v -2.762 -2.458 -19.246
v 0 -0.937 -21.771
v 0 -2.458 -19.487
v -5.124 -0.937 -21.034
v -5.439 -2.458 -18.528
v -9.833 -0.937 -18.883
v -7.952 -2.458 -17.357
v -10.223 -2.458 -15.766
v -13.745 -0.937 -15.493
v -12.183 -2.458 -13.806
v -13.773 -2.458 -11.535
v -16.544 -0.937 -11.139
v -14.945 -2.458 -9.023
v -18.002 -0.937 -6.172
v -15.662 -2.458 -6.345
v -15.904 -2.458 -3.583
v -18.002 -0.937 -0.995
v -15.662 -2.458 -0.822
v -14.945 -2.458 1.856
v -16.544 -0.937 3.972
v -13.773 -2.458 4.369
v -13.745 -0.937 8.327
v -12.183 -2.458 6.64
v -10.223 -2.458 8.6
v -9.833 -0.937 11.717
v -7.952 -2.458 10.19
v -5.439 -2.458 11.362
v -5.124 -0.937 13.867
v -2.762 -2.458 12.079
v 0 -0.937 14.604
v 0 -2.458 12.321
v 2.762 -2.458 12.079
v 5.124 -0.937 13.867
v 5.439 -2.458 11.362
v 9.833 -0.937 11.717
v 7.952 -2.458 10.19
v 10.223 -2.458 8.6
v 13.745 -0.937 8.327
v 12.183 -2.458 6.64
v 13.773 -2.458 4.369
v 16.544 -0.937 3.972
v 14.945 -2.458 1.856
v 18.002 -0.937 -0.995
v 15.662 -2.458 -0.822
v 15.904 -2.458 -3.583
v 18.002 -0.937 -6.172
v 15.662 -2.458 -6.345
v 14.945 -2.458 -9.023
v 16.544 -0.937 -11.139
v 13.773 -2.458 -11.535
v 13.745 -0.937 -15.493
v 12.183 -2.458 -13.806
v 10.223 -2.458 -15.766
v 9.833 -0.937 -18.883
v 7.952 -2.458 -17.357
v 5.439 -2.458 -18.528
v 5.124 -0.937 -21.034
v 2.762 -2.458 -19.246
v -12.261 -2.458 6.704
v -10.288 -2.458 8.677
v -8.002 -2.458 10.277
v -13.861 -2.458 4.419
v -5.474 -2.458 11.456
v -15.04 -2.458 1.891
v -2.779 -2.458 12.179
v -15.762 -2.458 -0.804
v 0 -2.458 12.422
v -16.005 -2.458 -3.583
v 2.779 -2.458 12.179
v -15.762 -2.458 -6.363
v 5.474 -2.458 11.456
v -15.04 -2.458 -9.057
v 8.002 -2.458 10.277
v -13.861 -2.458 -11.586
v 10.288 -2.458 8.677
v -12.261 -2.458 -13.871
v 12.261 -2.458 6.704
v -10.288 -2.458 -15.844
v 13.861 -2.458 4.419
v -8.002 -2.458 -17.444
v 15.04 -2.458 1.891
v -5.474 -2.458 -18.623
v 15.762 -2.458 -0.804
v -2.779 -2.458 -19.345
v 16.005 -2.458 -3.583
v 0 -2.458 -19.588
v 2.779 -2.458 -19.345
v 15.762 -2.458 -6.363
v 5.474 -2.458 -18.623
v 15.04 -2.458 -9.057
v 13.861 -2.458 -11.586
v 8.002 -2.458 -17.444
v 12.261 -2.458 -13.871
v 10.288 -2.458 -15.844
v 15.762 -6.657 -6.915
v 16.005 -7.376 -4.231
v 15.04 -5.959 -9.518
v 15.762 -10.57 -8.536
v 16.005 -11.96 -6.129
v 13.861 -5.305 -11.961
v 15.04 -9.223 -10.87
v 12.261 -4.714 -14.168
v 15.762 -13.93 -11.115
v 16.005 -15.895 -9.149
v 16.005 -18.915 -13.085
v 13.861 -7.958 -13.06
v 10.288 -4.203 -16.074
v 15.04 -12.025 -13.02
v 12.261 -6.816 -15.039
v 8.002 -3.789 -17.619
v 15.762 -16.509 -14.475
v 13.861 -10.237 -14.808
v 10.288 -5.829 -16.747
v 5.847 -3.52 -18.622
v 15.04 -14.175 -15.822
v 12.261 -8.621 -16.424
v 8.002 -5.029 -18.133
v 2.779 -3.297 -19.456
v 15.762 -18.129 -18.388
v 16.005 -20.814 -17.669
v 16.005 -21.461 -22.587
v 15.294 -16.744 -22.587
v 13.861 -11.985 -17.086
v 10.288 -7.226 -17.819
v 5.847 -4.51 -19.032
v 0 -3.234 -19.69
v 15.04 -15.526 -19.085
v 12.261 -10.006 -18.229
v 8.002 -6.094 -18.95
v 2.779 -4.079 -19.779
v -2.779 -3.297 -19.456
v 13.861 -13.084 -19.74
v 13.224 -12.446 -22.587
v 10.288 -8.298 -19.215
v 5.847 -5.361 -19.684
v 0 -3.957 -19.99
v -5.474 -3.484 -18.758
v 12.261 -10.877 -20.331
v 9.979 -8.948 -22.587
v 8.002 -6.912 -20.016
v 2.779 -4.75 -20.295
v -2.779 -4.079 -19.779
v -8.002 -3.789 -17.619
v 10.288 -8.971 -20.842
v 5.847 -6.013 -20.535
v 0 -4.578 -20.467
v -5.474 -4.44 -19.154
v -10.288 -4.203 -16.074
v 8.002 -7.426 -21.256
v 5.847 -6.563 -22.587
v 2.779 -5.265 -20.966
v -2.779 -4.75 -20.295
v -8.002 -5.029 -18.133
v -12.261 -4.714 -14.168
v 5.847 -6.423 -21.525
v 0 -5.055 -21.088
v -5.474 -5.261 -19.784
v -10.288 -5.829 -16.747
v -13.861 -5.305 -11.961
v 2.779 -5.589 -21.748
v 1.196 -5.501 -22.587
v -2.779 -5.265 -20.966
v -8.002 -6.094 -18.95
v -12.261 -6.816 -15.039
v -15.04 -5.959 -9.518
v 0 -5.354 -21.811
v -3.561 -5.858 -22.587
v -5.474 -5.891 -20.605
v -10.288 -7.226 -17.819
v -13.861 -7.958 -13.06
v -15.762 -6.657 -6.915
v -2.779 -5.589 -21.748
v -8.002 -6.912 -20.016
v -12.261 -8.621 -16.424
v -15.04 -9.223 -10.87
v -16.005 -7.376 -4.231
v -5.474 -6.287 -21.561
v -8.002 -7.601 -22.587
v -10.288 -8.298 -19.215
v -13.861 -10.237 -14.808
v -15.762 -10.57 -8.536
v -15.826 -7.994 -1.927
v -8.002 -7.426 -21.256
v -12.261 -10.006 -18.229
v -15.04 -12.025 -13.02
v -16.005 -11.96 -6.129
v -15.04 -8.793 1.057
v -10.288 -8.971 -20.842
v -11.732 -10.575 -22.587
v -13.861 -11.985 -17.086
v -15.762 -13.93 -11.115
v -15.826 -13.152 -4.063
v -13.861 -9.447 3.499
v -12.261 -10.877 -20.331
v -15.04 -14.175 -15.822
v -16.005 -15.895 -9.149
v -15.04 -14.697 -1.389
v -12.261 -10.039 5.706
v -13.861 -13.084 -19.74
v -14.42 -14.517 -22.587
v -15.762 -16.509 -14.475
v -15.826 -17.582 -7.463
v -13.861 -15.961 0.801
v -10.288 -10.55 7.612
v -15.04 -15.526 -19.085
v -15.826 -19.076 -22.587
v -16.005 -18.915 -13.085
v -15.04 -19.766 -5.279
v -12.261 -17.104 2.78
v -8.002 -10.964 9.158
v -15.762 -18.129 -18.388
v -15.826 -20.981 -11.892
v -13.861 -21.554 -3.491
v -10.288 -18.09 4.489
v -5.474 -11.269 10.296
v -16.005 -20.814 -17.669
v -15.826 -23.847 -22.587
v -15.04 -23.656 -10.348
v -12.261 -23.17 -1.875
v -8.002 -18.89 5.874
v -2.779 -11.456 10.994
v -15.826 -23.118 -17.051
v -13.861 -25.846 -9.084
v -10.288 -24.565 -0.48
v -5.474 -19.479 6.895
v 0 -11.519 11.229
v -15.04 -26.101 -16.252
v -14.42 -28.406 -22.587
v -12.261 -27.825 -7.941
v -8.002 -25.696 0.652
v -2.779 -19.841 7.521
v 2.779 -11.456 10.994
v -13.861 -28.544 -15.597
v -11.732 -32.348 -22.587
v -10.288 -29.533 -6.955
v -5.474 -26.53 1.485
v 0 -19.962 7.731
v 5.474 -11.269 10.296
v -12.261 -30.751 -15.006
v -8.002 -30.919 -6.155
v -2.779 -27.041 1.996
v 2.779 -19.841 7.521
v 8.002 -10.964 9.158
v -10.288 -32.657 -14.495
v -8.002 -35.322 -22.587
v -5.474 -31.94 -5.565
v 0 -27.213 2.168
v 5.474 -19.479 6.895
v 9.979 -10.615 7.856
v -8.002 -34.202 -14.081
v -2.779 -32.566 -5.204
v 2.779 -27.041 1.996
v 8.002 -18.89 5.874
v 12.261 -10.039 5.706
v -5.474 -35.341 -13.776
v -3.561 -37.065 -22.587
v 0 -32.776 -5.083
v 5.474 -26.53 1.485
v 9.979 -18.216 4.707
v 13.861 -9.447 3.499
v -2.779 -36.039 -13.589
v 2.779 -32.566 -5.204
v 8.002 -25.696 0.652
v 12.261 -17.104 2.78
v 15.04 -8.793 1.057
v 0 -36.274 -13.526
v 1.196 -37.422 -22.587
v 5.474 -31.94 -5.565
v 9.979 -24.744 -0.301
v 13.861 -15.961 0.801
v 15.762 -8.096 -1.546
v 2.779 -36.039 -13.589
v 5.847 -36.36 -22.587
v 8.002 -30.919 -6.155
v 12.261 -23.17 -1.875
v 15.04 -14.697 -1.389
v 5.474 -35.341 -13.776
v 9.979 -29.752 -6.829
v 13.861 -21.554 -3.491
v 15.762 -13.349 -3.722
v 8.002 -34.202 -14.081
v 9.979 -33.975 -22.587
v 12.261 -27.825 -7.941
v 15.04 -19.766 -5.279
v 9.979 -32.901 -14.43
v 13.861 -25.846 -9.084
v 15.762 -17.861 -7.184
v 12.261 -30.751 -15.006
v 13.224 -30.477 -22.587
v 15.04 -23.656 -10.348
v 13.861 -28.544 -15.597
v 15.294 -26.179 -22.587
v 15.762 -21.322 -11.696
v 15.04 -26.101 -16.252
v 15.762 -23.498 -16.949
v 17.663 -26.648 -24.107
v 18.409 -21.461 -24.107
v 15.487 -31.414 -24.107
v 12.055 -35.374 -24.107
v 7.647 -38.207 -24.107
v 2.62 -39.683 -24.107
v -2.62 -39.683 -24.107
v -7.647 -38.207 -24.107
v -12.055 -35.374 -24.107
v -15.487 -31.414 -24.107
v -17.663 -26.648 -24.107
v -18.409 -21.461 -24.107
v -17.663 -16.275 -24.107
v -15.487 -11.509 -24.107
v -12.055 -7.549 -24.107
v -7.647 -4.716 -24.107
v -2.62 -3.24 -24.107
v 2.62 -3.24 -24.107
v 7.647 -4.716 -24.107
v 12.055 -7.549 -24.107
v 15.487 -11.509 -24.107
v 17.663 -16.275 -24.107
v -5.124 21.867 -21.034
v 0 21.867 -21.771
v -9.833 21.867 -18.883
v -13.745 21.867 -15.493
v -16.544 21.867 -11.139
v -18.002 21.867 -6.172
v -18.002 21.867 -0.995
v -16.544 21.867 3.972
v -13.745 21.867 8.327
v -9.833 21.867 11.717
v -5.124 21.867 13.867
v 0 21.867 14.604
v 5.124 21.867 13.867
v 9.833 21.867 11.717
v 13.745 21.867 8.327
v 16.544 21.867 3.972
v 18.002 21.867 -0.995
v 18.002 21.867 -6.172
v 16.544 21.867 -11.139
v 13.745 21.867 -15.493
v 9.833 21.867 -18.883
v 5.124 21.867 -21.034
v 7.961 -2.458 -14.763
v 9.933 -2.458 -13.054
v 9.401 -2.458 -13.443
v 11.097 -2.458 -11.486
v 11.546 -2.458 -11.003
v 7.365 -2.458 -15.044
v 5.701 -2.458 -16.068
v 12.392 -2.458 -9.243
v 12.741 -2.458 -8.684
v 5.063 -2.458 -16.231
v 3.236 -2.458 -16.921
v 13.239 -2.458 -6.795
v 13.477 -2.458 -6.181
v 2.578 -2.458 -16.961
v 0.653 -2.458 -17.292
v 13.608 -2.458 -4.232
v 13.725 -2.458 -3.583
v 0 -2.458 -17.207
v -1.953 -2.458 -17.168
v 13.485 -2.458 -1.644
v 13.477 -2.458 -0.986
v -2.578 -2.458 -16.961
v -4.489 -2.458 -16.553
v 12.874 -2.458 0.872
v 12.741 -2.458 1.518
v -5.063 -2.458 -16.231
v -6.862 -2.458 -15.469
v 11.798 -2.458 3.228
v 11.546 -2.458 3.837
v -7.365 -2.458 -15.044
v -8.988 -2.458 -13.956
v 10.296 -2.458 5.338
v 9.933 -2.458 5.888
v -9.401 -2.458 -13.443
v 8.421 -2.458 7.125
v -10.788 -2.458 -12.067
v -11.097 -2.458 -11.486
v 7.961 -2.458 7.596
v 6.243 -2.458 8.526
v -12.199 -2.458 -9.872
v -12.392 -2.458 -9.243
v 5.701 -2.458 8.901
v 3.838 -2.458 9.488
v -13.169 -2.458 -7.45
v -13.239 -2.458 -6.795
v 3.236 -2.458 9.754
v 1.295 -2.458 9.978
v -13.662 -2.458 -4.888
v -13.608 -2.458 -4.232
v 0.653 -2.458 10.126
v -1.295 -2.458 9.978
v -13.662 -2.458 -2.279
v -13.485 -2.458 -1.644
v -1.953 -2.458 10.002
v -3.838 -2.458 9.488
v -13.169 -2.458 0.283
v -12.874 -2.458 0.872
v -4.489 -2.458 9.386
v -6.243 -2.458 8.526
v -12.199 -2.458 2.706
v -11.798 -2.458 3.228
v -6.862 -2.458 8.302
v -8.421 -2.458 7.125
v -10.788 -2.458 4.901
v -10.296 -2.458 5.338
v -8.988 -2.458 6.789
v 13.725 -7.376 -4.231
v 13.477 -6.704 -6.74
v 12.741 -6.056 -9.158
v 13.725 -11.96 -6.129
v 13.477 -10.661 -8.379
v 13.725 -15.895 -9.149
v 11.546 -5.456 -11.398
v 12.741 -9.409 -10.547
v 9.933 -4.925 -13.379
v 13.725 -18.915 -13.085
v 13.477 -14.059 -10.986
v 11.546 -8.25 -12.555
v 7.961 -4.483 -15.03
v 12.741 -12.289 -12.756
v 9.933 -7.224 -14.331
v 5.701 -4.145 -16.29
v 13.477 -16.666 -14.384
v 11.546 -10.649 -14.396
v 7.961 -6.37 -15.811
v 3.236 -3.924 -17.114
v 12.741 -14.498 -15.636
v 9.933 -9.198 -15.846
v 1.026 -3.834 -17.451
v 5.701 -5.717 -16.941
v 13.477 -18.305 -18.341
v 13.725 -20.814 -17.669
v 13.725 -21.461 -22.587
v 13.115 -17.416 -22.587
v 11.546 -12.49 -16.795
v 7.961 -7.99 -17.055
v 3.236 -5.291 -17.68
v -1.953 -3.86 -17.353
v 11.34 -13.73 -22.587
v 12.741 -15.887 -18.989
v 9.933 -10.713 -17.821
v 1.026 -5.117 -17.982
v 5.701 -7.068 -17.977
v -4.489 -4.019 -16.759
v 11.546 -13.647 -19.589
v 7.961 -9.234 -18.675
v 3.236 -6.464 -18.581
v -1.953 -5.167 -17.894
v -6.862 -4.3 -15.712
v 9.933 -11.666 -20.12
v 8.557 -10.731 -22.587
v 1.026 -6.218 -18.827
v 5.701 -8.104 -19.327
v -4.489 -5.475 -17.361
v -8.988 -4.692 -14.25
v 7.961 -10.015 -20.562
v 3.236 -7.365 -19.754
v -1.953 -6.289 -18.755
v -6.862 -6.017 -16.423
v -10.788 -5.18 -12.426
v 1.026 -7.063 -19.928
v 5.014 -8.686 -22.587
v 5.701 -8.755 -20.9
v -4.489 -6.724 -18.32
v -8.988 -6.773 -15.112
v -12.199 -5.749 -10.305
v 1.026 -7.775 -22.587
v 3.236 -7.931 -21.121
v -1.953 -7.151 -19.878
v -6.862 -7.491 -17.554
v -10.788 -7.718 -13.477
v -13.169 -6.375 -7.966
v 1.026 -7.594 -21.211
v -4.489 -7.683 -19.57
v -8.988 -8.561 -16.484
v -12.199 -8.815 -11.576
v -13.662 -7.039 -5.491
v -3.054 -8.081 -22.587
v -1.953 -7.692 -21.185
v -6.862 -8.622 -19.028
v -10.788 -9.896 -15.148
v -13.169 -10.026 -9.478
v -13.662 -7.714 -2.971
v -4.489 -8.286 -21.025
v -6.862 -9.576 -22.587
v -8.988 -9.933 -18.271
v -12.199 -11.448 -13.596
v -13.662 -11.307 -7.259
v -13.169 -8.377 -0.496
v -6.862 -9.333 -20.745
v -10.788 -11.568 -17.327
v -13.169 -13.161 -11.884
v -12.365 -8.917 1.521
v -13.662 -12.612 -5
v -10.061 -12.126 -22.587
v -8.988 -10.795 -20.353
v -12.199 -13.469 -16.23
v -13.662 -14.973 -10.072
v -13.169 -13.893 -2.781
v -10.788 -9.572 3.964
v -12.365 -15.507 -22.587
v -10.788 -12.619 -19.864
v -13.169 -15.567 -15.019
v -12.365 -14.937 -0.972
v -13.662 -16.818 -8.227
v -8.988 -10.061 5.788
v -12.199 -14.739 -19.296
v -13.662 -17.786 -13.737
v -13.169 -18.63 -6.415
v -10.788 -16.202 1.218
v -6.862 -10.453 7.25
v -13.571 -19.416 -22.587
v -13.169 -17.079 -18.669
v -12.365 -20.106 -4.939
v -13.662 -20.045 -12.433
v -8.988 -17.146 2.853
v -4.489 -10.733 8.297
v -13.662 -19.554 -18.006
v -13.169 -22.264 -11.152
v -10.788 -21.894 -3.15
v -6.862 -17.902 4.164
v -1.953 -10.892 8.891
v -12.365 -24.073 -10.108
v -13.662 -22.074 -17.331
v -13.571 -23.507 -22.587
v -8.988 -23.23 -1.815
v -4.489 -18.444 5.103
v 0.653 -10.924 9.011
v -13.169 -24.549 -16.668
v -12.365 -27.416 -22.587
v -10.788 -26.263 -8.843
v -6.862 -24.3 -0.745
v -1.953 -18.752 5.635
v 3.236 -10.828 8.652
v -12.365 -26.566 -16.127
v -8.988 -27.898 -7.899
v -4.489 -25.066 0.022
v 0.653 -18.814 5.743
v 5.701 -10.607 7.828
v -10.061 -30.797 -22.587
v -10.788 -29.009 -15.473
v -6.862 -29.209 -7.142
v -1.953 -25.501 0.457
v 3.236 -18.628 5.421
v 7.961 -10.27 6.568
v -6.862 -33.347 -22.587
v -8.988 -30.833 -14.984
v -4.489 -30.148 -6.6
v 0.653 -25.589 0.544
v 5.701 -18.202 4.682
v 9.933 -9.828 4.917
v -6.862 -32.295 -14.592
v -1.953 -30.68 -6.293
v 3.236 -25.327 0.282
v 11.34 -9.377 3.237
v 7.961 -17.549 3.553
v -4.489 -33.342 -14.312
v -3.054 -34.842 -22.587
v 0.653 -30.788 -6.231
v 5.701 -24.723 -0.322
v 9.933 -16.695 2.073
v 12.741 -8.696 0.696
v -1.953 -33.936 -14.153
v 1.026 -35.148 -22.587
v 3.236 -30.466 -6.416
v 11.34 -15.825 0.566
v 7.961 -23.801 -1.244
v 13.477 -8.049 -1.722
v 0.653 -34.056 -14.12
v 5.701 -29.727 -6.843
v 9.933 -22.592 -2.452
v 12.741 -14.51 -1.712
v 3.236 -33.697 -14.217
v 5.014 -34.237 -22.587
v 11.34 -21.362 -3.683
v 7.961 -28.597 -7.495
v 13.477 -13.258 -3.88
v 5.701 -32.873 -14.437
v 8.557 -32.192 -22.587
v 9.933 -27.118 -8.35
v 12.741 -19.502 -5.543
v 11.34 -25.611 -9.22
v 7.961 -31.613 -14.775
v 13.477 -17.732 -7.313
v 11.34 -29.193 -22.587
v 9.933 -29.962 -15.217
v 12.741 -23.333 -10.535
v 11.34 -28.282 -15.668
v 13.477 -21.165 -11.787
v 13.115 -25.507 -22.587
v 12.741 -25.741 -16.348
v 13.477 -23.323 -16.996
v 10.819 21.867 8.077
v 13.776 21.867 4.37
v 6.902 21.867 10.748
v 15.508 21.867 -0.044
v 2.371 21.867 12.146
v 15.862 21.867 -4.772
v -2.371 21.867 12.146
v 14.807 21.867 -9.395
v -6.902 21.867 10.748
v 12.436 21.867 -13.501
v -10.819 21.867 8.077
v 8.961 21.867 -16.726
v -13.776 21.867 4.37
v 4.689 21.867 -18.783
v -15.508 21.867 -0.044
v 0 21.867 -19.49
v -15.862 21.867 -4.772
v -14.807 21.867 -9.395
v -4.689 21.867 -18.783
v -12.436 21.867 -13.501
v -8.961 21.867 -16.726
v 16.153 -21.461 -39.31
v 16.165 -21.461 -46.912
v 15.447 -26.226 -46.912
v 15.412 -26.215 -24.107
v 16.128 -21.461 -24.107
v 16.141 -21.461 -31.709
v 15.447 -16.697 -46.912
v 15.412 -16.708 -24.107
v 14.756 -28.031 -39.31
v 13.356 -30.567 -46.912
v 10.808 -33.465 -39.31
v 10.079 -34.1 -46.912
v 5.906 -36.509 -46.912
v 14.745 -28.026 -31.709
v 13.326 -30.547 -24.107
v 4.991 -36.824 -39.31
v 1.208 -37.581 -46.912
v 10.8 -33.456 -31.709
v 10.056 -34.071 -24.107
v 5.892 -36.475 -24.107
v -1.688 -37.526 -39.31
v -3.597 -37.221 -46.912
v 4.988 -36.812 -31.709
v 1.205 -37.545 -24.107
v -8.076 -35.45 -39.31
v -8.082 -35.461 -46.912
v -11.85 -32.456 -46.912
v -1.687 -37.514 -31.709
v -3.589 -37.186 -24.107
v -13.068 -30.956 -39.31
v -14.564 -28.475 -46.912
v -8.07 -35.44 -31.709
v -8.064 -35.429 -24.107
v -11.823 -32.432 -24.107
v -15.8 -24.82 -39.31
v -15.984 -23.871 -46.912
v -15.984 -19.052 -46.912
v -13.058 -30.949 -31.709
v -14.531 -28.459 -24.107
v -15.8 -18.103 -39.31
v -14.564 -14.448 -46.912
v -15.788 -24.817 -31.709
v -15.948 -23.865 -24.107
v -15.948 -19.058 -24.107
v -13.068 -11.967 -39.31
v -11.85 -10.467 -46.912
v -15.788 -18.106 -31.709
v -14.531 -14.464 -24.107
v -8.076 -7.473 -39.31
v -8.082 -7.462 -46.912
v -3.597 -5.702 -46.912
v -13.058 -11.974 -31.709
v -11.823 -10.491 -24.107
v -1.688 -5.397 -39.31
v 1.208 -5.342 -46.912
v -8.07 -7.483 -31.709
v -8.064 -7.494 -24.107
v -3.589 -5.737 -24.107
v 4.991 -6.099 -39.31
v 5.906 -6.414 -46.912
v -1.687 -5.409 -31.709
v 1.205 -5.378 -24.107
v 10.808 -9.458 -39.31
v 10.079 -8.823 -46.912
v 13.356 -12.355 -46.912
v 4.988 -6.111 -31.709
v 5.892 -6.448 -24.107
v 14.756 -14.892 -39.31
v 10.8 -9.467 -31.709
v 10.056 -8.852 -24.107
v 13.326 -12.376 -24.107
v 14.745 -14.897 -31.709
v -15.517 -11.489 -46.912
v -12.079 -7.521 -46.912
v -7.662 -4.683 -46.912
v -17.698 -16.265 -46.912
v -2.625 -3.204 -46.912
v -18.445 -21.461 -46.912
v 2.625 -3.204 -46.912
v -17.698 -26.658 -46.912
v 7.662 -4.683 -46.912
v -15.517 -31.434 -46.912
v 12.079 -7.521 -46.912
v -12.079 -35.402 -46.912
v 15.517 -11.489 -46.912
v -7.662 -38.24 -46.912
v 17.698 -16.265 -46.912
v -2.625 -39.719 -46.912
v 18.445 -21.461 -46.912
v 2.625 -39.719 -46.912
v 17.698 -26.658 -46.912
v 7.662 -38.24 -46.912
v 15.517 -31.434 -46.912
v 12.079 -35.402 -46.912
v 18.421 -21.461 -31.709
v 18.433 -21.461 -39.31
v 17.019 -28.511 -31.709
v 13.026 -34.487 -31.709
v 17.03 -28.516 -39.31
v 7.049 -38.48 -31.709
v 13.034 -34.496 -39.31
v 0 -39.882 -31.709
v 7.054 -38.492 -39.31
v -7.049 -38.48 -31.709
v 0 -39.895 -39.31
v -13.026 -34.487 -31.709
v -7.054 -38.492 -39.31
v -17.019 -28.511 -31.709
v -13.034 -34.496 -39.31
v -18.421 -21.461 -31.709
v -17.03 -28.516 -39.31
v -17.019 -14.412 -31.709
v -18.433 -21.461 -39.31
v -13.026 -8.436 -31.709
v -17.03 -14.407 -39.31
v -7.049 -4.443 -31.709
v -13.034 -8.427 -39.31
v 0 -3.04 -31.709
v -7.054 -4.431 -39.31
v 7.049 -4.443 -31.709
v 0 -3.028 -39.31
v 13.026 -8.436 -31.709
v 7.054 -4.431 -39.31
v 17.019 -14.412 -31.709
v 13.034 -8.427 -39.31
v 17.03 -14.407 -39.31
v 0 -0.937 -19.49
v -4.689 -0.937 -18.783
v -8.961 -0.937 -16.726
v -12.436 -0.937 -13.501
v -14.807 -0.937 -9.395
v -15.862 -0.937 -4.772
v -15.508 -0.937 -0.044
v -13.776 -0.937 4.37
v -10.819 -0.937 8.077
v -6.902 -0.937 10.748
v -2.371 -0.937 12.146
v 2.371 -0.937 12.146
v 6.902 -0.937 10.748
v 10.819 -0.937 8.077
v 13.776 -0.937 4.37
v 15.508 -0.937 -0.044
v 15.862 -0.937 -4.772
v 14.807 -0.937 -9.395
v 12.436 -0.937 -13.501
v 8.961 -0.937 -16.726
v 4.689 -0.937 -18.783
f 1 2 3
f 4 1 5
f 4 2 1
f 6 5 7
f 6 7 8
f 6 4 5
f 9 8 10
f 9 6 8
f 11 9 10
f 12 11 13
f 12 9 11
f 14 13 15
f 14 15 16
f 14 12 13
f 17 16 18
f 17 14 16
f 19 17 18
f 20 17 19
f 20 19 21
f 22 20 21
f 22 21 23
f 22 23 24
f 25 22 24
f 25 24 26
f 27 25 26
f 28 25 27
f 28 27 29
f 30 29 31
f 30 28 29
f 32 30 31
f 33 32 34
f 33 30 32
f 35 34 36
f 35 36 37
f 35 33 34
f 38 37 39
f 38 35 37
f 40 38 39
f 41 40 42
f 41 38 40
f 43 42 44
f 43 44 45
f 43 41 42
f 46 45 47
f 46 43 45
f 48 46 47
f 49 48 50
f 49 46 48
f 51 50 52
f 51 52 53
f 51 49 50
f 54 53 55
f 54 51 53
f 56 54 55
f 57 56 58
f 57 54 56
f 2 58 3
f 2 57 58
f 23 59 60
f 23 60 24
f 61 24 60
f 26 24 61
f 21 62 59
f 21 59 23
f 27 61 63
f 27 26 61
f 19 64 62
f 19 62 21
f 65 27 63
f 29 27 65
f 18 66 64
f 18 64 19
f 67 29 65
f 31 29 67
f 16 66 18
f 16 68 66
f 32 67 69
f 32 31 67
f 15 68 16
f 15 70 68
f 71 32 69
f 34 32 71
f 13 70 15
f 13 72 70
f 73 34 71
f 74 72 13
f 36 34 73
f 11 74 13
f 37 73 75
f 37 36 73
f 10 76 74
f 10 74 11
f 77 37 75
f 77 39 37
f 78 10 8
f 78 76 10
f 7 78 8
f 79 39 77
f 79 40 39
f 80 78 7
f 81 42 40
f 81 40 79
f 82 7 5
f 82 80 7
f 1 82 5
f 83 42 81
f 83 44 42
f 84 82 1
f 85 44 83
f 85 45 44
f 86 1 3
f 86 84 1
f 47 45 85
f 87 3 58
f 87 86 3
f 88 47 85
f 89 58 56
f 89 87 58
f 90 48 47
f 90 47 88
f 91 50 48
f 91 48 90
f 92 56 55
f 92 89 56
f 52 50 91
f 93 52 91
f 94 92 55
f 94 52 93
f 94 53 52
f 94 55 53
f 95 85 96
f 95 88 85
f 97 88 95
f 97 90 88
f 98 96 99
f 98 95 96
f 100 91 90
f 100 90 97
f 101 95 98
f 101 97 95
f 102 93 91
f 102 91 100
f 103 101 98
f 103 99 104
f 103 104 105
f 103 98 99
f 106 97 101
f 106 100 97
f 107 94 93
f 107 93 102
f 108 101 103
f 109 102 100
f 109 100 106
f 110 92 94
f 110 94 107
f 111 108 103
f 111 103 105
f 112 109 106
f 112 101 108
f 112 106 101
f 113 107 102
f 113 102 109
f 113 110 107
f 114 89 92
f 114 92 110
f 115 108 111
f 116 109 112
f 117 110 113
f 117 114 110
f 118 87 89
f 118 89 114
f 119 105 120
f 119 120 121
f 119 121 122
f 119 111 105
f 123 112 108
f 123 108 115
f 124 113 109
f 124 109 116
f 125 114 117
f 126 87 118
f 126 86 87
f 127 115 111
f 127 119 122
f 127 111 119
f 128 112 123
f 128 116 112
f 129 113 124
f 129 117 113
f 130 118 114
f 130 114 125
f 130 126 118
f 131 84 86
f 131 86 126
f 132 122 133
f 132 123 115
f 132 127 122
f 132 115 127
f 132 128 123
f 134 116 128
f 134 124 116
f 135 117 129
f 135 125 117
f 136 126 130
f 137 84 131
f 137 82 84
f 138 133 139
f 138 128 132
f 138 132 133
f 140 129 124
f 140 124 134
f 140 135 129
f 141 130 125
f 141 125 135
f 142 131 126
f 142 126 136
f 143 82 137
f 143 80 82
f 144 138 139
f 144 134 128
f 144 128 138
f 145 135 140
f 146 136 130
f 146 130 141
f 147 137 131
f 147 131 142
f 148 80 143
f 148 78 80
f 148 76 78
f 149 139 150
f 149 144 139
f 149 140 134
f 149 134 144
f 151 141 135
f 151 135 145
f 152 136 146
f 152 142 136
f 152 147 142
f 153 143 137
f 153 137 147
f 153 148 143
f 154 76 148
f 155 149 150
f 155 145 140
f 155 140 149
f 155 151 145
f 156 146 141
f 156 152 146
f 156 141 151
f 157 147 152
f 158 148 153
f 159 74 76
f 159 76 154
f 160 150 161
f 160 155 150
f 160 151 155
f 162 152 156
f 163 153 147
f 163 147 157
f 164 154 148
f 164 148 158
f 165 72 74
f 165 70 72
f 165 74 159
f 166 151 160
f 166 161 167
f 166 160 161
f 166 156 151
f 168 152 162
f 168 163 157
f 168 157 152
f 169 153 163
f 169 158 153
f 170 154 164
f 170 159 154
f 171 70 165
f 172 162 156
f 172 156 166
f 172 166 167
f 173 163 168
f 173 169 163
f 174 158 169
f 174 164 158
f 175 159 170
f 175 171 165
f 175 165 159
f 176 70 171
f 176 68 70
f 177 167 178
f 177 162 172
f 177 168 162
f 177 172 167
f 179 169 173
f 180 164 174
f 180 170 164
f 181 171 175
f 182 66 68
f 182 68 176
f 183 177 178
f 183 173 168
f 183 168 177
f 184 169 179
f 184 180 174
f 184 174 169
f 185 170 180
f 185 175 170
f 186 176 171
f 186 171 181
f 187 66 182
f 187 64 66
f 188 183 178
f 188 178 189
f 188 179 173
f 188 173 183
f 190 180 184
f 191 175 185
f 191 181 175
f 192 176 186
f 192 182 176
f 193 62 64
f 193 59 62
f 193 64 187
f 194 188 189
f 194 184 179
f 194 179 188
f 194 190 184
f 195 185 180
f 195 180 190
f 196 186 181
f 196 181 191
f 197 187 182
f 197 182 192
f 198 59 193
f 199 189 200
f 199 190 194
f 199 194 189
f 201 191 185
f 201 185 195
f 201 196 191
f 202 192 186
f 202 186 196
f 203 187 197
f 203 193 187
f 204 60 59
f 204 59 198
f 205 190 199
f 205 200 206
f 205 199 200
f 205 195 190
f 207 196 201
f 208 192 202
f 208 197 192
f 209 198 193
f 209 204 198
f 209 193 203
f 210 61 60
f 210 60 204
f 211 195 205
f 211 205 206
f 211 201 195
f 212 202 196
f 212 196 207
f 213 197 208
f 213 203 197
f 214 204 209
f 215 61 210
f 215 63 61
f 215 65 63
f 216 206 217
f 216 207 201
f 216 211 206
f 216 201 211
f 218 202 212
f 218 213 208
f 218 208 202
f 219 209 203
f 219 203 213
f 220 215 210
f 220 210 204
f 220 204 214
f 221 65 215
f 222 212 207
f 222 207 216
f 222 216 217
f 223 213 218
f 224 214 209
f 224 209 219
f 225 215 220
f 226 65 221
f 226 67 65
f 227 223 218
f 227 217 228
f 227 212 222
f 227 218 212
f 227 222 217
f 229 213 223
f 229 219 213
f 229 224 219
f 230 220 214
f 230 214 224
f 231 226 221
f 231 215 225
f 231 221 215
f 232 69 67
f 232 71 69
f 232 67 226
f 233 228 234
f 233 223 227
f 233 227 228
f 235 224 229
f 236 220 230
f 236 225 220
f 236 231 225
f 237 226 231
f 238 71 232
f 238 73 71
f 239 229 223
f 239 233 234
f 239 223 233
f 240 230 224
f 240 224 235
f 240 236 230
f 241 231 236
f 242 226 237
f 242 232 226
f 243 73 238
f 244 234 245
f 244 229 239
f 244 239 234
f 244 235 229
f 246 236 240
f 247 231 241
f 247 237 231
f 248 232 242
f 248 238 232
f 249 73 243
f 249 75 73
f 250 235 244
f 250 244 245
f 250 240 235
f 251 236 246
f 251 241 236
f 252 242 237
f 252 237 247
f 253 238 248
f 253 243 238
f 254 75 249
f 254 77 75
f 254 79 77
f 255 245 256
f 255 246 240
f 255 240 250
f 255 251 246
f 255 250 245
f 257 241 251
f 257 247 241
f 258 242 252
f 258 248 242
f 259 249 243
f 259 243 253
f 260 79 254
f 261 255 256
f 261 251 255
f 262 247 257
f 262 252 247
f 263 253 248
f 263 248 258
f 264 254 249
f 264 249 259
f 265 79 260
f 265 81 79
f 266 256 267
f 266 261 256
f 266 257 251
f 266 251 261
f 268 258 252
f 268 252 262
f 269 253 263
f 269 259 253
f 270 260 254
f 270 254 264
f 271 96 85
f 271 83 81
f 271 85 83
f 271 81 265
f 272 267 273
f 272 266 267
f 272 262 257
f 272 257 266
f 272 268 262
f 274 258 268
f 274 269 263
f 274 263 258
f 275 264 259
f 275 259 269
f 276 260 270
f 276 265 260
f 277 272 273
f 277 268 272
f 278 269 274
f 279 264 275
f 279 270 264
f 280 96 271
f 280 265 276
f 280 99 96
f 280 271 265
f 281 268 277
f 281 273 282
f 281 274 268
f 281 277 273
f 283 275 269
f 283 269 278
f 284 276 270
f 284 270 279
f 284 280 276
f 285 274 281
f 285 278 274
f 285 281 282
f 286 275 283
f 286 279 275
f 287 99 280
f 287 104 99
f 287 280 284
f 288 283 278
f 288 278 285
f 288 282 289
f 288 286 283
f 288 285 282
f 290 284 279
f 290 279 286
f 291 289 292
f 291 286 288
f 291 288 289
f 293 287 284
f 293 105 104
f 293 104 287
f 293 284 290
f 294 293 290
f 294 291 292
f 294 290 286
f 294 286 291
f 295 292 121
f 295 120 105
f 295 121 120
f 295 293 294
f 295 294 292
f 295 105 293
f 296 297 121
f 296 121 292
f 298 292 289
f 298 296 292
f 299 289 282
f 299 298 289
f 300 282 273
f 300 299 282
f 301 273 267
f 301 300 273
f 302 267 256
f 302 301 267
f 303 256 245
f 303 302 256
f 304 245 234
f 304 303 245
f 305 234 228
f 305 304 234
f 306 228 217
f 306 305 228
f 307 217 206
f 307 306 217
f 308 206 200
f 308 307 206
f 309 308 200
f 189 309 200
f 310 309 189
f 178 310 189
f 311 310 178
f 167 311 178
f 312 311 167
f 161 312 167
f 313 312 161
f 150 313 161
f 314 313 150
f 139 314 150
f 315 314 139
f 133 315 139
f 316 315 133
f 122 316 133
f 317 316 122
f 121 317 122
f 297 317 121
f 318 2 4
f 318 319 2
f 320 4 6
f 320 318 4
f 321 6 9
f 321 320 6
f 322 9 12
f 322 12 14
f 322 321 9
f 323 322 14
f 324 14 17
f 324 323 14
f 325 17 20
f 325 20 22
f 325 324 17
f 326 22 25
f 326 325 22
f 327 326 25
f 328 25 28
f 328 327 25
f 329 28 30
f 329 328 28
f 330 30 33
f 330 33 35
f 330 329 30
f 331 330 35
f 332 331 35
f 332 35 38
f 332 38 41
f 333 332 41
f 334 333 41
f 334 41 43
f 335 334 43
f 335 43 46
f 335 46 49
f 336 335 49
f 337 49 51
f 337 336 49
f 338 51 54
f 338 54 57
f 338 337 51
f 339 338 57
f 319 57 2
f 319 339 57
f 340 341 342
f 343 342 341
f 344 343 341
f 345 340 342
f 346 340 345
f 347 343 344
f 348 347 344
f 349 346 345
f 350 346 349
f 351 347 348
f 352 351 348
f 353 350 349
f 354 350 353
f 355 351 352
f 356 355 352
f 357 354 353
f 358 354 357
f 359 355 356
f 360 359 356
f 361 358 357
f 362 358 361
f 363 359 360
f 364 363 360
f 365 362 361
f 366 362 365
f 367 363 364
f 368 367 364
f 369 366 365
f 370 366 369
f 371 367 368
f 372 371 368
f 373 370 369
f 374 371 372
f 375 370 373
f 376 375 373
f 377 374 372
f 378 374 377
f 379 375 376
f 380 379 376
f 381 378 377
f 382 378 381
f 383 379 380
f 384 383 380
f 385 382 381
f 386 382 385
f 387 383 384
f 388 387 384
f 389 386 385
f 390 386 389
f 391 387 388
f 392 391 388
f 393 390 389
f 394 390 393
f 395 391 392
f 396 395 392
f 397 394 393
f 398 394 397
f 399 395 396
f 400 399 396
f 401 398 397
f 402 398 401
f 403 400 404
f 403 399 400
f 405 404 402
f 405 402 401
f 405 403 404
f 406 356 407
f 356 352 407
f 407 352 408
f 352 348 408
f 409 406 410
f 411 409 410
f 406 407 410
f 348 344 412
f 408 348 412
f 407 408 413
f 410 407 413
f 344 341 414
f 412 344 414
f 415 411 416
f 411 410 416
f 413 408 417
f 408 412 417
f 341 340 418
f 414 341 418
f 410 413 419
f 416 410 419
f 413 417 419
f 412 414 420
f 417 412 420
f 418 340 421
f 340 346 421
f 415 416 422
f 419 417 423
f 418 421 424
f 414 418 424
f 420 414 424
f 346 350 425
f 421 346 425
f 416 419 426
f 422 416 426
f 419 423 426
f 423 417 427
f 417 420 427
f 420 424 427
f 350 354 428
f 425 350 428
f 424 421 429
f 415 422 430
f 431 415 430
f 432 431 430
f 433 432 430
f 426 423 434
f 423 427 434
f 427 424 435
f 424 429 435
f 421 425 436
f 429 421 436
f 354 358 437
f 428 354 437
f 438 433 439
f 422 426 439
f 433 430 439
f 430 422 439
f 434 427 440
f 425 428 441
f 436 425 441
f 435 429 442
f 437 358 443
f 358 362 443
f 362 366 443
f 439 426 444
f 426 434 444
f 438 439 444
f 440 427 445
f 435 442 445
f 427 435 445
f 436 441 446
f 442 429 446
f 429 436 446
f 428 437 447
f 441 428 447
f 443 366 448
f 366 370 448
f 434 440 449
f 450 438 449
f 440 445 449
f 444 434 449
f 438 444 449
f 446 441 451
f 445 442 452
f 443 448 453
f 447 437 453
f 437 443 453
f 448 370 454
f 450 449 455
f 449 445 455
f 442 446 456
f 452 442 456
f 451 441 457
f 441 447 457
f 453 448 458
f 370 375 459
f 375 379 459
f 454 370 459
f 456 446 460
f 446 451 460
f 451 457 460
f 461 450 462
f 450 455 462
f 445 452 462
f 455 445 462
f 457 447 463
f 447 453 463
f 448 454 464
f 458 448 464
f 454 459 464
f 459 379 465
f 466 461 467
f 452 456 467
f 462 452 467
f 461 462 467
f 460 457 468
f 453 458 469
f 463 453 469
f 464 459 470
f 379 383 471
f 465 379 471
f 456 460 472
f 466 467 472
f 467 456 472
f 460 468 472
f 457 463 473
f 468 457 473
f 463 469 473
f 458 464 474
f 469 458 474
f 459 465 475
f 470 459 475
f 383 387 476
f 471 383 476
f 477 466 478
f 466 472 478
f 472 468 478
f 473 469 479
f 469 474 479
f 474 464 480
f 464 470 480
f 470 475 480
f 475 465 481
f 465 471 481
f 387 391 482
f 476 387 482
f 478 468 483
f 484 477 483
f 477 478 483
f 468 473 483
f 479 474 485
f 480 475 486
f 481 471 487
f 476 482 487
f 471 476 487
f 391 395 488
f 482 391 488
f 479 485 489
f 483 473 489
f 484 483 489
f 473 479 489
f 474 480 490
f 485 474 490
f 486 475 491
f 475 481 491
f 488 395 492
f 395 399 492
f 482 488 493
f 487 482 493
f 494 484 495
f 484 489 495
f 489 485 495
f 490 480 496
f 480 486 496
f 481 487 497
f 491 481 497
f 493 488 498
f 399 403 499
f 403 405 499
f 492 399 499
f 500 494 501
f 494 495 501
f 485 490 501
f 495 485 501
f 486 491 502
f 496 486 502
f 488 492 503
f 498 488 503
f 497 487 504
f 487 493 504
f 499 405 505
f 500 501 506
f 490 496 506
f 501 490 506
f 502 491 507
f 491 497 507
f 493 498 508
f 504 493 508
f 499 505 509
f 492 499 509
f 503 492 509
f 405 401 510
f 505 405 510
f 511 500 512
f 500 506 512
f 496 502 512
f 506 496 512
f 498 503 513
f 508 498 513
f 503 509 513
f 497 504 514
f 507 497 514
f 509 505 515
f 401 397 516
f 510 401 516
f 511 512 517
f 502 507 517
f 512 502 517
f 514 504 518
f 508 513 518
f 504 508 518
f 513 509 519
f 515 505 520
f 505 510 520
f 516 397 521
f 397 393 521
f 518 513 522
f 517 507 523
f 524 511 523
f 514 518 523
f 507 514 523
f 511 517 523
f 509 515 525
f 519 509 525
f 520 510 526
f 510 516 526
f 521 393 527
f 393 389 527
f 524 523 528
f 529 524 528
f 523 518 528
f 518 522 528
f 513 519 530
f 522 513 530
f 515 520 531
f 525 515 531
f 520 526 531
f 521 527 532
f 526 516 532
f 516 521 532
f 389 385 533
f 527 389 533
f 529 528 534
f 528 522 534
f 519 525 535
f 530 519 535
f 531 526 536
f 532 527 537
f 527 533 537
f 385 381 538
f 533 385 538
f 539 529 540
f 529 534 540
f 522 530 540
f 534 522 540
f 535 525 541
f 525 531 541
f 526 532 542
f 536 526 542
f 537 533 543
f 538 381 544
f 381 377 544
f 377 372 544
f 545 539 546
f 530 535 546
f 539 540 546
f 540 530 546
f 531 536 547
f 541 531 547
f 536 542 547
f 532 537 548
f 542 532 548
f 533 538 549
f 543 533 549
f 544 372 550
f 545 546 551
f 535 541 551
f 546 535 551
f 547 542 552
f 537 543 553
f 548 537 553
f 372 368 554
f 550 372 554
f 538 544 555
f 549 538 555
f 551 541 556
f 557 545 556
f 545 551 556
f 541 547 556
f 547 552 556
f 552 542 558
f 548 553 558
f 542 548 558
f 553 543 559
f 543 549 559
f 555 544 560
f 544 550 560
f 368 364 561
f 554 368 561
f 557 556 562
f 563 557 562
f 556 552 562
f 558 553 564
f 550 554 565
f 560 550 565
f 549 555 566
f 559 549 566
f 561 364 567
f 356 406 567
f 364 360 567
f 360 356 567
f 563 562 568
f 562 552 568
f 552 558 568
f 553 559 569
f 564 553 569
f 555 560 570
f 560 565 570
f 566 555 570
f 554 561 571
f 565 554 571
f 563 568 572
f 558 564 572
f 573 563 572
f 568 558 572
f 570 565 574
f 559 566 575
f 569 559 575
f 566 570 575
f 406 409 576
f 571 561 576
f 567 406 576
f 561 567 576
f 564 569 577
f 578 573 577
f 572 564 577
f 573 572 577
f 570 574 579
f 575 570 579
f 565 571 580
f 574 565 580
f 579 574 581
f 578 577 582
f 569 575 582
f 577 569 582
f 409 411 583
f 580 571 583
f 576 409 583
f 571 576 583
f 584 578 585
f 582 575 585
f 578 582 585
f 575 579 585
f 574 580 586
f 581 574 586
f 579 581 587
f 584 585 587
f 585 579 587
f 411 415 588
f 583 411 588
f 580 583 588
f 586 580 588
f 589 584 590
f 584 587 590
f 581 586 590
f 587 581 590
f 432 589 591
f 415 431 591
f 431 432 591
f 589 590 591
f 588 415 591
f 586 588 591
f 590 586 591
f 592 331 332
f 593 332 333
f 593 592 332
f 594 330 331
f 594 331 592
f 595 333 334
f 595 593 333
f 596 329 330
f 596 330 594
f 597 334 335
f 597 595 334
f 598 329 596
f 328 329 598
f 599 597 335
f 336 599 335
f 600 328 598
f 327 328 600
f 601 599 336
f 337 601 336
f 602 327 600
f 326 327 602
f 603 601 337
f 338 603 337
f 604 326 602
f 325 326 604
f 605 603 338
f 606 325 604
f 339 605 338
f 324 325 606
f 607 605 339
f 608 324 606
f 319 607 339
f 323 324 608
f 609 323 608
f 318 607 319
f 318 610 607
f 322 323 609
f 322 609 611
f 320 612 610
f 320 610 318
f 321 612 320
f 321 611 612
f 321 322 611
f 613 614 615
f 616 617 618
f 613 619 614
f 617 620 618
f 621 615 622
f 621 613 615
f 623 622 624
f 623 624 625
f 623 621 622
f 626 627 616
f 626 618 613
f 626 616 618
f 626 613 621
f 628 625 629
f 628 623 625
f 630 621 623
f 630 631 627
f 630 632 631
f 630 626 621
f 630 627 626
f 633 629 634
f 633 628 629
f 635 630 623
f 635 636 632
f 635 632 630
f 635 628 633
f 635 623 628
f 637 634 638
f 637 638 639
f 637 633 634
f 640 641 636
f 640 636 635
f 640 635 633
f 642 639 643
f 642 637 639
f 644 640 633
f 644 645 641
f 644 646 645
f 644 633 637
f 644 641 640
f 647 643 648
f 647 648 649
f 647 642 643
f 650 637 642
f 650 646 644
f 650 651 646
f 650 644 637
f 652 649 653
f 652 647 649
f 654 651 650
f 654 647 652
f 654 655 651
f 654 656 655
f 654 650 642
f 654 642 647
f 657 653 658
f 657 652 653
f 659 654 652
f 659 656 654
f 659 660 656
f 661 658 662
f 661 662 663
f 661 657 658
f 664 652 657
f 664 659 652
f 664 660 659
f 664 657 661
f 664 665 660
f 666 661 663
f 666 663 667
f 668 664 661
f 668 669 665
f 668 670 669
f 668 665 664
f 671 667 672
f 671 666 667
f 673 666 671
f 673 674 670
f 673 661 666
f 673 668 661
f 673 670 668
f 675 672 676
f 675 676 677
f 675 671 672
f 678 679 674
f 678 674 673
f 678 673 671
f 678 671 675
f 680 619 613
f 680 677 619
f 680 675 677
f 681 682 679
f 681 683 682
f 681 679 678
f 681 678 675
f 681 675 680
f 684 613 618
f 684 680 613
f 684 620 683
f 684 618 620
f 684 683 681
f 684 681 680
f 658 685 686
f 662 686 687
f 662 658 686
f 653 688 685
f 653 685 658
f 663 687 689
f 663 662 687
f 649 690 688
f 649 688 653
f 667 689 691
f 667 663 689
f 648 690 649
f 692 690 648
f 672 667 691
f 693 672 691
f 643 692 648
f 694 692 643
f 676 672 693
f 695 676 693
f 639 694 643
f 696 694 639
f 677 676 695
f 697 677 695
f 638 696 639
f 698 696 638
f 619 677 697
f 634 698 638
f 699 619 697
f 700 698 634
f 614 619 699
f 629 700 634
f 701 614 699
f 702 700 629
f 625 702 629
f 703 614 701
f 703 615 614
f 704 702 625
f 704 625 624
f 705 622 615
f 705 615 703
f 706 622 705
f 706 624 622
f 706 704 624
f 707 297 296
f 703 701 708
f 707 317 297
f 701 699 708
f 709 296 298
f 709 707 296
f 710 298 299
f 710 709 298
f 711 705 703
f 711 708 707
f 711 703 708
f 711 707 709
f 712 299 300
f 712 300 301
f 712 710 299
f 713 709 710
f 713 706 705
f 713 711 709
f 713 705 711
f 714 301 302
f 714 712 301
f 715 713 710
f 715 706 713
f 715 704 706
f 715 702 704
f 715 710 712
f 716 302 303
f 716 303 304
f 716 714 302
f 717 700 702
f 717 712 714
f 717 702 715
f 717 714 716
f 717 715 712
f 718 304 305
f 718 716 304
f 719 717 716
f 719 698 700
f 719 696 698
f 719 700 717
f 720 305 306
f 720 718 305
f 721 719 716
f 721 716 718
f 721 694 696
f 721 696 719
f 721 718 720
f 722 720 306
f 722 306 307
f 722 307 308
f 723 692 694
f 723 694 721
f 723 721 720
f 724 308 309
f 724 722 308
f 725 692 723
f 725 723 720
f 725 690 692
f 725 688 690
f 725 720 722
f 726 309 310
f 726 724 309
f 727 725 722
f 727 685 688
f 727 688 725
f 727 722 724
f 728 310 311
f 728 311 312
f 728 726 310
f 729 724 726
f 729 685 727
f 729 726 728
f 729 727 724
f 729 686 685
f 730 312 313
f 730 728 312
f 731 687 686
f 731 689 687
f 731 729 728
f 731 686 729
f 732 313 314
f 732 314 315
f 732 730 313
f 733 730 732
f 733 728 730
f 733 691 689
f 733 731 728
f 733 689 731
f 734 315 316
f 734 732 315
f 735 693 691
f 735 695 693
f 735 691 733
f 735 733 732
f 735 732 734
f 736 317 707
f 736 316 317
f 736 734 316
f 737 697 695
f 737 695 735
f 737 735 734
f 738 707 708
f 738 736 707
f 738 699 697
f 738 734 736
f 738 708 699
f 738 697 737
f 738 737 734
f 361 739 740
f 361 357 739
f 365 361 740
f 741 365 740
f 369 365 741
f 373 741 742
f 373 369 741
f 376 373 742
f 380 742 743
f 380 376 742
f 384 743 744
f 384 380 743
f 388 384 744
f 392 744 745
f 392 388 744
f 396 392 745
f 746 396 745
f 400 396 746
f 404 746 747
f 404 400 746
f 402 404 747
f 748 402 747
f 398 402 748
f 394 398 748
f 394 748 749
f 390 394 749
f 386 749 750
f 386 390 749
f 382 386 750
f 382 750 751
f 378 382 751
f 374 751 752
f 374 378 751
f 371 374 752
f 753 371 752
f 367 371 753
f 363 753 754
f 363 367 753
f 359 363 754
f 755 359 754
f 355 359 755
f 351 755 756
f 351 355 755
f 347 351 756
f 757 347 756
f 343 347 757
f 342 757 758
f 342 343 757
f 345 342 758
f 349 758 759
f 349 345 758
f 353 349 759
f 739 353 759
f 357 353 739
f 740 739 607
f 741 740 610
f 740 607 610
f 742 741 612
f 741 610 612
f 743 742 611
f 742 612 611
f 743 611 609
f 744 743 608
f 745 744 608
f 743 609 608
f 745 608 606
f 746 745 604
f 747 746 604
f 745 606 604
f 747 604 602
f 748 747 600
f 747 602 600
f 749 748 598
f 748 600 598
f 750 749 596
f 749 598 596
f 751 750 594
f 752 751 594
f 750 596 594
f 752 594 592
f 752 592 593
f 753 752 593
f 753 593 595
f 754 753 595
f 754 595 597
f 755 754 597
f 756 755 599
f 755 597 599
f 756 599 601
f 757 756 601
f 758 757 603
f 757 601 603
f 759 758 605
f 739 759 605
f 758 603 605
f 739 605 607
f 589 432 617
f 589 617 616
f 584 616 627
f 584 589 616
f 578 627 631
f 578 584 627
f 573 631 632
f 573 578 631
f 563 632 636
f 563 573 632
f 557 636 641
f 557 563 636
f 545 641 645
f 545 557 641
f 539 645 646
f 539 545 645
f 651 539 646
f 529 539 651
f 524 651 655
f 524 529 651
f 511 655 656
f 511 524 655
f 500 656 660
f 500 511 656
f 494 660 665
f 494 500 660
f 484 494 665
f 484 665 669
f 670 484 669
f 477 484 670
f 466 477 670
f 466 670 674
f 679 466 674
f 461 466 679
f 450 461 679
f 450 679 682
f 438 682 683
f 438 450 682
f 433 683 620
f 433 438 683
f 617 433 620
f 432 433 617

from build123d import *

# Parameters (mm, degrees)
SKETCH1_R      = 21.055
SKETCH1_R_2    = 18.055
REVOLVE1_ANGLE = 90
SKETCH14_W     = 3
SKETCH14_H     = 30
SCALE1_SCALE   = 0.760151086


with BuildPart() as part:
    # Sketch1 → Revolve1 (revolve)
    with BuildSketch(Plane(origin=(0, 0, 0), x_dir=(1, 0, 0), z_dir=(0, 1, 0))):
        Circle(SKETCH1_R)
        Circle(SKETCH1_R_2, mode=Mode.SUBTRACT)
    revolve(axis=Axis((-39.148672595, 0, -25), (1, 0, 0)), revolution_arc=REVOLVE1_ANGLE)

    # Sketch14 → Revolve3 (revolve)
    with BuildSketch(Plane(origin=(0, 0, 0), x_dir=(0, 0, -1), z_dir=(1, 0, 0)), mode=Mode.PRIVATE) as revolve3_sk:
        Polygon((-23.925834548, 2), (-20.925834548, 2), (-17.922072033, 0), (-20.922072033, 0), align=None)
        with Locations((-22.425834548, 17)):
            Rectangle(SKETCH14_W, SKETCH14_H)
    revolve(revolve3_sk.sketch.rotate(Axis((0, 0, 0), (0, 1, 0)), 180), axis=Axis((0, 0, 0), (0, 1, 0)))

    # Sketch20 → Revolve4 (revolve)
    with BuildSketch(Plane(origin=(0, 0, 0), x_dir=(0, 0, -1), z_dir=(1, 0, 0)), mode=Mode.PRIVATE) as revolve4_sk:
        Polygon((27, -49.217355789), (57, -49.26533892), (57, -46.26533892), (27, -46.217355789), align=None)
        Polygon((25, -46.055), (27, -49.217355789), (27, -46.217355789), (25, -43.055), align=None)
    revolve(revolve4_sk.sketch.rotate(Axis((0, -25, -25), (0, 0, -1)), 270), axis=Axis((0, -25, -25), (0, 0, -1)))


with BuildPart() as part_1:
    # Scale1: scaled about (0, -10.246924986, -14.93985455)
    add(part.part.scale(SCALE1_SCALE).moved(Location((0, -2.45771383, -3.583307889))))


solid = part_1.part
